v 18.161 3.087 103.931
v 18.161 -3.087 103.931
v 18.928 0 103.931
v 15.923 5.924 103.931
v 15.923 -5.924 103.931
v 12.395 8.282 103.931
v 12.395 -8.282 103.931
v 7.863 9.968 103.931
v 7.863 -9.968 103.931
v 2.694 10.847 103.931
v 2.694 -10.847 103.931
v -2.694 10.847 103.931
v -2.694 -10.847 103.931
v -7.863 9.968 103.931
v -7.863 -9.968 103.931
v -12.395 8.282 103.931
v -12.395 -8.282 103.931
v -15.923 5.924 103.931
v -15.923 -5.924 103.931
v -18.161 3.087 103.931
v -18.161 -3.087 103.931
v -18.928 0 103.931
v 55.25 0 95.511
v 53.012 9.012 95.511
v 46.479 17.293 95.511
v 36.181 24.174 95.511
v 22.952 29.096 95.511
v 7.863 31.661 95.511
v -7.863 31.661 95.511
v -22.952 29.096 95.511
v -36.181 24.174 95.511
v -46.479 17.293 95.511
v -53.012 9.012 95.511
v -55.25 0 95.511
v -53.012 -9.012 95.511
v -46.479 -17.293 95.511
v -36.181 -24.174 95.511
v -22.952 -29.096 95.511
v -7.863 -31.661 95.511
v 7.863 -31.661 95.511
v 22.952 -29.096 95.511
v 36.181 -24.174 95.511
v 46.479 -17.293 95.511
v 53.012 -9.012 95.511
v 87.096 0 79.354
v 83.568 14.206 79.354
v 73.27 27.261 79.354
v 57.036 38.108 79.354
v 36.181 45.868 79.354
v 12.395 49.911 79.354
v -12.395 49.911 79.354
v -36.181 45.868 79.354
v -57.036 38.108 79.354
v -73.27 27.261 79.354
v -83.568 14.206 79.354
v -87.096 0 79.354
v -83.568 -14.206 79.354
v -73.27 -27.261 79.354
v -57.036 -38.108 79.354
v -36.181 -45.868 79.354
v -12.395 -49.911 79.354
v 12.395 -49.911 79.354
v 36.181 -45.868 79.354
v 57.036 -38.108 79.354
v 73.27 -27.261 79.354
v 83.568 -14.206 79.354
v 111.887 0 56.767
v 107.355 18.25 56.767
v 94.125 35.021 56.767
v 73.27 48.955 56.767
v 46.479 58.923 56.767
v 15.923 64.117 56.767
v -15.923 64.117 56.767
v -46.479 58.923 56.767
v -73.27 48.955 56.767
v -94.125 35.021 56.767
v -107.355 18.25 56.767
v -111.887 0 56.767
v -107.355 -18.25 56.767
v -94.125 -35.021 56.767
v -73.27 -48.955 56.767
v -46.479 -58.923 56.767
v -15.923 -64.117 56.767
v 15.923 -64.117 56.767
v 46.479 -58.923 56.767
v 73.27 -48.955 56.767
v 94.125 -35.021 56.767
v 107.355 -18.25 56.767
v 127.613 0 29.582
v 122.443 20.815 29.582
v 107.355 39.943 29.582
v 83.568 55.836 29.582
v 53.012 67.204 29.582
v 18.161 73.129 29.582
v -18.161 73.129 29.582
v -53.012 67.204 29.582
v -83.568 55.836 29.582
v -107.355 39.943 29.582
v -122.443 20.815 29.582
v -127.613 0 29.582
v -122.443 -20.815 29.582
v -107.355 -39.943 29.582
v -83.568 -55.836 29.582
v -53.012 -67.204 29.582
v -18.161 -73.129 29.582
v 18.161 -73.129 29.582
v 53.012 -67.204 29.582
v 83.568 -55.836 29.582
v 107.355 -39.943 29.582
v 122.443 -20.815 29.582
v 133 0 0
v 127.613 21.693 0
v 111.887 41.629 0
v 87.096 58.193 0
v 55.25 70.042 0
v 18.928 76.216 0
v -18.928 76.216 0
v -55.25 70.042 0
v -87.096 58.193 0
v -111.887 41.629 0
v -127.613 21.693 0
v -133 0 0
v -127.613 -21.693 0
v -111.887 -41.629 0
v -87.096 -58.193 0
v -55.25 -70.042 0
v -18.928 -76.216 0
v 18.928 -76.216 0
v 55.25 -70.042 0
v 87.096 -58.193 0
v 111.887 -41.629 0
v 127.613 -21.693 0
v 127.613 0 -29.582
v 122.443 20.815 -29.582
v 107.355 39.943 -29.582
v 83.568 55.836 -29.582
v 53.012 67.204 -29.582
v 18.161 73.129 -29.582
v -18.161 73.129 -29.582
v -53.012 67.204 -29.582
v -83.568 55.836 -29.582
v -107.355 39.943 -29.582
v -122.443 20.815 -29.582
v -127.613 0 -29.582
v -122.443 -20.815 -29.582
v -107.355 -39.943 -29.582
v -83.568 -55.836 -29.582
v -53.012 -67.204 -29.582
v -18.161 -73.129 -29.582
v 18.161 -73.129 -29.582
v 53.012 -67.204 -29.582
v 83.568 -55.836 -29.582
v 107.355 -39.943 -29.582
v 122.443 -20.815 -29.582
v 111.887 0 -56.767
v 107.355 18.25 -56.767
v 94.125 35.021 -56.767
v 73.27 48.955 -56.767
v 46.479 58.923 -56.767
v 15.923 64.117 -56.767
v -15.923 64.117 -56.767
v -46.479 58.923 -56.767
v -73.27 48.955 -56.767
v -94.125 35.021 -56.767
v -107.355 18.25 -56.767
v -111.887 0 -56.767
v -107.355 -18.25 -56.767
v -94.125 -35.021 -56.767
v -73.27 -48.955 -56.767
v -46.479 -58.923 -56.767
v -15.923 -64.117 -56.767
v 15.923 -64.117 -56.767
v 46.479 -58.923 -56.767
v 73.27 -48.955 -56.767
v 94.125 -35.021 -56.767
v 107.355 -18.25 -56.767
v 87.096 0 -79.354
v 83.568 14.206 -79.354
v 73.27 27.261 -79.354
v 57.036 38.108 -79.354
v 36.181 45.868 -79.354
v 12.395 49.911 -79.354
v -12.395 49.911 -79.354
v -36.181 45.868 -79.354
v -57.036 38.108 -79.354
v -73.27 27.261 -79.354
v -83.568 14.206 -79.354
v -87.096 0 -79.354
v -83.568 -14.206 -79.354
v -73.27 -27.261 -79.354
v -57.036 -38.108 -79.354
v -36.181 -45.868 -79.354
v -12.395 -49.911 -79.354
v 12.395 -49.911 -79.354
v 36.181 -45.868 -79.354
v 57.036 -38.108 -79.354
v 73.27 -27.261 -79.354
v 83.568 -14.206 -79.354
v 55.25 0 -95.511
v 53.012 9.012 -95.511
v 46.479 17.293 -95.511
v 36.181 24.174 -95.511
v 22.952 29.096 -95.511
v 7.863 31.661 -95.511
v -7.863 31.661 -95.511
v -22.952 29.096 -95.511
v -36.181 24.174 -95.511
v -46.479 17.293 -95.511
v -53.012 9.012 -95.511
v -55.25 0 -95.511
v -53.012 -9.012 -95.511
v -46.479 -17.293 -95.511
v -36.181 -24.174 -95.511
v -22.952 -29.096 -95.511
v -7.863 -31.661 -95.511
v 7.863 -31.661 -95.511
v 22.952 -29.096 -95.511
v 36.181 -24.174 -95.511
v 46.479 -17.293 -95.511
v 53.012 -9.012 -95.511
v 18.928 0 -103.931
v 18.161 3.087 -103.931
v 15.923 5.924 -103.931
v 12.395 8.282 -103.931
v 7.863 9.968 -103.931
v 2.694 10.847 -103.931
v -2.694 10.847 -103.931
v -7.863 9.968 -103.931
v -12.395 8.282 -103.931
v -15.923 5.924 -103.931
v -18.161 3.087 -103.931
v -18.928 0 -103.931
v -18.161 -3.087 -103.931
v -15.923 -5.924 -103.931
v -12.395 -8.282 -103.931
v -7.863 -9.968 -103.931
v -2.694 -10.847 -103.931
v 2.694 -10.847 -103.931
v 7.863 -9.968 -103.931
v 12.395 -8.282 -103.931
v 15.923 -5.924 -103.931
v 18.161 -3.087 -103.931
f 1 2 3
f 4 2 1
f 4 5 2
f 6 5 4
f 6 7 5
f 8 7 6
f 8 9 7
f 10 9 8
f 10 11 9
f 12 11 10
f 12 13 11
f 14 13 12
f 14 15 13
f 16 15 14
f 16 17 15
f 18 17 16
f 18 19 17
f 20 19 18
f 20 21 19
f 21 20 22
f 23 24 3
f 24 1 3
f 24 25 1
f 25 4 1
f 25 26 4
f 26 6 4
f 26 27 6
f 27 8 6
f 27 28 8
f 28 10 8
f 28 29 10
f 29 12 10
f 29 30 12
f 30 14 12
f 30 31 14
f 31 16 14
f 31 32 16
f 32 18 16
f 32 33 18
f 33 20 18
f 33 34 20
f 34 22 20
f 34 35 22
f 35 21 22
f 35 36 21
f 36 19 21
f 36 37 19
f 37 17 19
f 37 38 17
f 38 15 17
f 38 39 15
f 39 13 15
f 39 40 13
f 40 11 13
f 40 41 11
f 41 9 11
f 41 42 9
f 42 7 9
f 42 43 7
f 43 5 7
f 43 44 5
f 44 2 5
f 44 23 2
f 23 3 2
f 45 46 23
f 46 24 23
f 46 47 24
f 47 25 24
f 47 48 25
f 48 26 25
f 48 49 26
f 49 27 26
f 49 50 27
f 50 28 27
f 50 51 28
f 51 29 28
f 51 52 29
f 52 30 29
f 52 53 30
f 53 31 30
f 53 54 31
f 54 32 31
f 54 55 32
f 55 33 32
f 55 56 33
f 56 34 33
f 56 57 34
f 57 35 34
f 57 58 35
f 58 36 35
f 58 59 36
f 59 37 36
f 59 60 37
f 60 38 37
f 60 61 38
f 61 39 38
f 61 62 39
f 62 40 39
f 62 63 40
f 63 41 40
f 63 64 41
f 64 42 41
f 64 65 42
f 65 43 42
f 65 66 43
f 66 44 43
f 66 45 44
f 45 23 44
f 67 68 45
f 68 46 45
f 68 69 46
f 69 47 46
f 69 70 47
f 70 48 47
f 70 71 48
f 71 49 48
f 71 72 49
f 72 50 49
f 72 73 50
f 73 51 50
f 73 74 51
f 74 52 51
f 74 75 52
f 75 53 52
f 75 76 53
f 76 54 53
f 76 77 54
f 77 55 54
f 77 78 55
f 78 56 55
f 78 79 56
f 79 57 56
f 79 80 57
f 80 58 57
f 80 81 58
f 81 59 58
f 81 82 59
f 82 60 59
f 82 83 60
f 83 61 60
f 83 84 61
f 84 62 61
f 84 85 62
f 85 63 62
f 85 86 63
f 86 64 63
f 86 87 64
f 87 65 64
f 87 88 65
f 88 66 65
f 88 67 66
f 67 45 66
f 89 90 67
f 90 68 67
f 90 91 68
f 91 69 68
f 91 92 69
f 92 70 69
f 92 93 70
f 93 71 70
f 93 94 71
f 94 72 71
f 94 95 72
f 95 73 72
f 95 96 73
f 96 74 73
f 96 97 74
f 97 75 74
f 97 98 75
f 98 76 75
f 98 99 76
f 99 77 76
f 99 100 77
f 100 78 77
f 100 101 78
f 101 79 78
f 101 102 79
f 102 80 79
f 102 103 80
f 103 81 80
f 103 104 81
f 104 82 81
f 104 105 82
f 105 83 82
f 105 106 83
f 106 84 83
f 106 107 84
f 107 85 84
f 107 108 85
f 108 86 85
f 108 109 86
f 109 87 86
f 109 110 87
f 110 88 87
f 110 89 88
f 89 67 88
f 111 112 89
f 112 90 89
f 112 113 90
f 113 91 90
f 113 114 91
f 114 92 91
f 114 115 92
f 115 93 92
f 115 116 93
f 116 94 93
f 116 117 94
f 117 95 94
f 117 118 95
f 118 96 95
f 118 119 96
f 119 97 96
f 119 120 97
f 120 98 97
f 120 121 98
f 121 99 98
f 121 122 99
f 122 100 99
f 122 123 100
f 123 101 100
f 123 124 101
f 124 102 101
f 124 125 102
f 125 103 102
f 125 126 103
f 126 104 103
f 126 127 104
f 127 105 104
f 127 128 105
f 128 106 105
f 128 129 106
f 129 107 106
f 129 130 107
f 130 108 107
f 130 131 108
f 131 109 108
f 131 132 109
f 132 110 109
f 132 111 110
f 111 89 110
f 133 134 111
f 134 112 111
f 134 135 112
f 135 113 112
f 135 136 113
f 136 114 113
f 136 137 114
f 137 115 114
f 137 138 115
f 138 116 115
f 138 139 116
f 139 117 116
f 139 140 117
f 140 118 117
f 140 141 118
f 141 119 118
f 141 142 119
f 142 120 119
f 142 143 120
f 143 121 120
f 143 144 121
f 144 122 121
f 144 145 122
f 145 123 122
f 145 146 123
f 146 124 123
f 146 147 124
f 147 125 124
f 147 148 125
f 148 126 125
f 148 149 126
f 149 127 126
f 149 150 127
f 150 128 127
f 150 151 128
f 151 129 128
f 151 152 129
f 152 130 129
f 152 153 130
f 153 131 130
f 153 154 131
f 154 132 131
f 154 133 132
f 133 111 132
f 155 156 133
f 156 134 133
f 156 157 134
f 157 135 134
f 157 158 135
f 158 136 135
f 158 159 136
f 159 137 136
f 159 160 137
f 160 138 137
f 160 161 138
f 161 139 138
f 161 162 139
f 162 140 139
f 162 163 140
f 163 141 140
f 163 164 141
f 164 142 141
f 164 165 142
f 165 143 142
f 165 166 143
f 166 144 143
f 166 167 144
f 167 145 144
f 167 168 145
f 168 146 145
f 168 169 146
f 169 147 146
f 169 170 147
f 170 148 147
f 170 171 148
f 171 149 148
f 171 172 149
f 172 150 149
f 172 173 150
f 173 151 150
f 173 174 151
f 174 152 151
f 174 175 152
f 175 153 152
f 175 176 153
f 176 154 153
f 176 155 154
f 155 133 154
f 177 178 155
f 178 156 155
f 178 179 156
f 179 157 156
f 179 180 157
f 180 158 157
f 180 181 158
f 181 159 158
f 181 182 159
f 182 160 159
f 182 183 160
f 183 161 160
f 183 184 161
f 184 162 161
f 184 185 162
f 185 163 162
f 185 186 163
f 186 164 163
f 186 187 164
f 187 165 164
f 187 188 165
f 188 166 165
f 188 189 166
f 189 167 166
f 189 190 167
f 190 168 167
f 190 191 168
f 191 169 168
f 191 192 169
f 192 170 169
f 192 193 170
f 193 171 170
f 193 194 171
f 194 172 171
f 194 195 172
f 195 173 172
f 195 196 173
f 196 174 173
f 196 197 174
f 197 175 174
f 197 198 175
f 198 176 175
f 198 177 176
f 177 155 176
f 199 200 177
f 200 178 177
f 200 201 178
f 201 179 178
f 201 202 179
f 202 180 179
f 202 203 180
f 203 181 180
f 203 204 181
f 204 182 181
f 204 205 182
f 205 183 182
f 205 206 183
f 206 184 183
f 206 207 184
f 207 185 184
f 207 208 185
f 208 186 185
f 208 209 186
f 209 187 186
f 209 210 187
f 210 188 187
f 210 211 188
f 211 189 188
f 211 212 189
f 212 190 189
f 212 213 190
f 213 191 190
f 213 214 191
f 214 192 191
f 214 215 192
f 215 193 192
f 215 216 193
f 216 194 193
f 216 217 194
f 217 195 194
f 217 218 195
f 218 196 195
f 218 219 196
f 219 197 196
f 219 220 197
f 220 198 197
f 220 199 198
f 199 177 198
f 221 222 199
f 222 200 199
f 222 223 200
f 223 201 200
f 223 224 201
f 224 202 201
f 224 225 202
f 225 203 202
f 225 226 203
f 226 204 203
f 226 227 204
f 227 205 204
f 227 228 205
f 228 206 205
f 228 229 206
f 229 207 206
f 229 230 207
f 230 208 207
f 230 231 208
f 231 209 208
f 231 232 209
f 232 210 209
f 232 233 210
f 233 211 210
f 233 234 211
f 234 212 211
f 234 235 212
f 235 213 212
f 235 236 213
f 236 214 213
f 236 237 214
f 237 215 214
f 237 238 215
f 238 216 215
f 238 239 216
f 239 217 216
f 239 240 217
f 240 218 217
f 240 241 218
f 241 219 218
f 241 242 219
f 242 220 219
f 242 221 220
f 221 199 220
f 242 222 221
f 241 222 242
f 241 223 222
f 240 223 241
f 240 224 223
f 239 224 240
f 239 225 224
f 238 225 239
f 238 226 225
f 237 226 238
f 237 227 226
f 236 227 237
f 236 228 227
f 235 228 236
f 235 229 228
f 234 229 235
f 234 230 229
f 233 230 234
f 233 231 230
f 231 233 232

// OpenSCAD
// Generated by SolidPython 1.0.1 on 2020-07-29 00:46:54


scale(v = [19, 11, 15]) {
	sphere(r = 7);
}
/***********************************************
*********      SolidPython code:      **********
************************************************
 
# import packages: SolidPython
from solid import *
from solid.utils import *
from itertools import chain, combinations, permutations


class Resize:

    def __init__(self, scad_file):
        self.scad_file = scad_file
        #self.scad_file = import_scad(scad_file)
        # cone/cylinder param:
        self.r1 = 0
        self.r2 = 0
        self.h = 0
        # rectangular prism param:
        self.w = 0
        self.l = 0
        # ellipse param:
        self.r = 0

    # import OpenScad code (file name corresponds to shape)


    # classify shape + parameters
    def assign(self, param1, param2, param3):
        if self.scad_file == 'cone.scad':
            self.r1 = param1
            self.r2 = param2
            self.h = param3
        elif self.scad_file == 'cylinder.scad':
            self.r1 = param1
            self.r2 = param2
            self.h = param3
        elif self.scad_file == 'rectangularPrism.scad':
            self.h = param1
            self.l = param2
            self.w = param3
        else:
            self.r = param1
            self.h = param2

    # resize parameters
    def iterate(self):
        x = range(3, 20, 2)
        i = 1
        if self.scad_file == 'cone.scad':
            tempList = list(permutations(x, 2))
            for temp in tempList:
                param1 = temp[0]
                param2 = temp[1]
                filepath = 'produced_scad_files/' + 'cone' + str(param1) + '_' + str(param2) + '_' + '.scad'
                scad_render_to_file(cylinder(h=param1, r1=param2, r2=0), filepath)

        elif self.scad_file == 'cylinder.scad':
            tempList = list(permutations(x, 3))
            for temp in tempList:
                param1 = temp[0]
                param2 = temp[1]
                filepath = 'produced_scad_files/' + 'cylinder' + str(param1) + '_' + str(param2) + '_' + '.scad'
                scad_render_to_file(cylinder(h=param1, r1=param2, r2=param2), filepath)

        elif self.scad_file == 'rectangularPrism.scad':
            tempList = list(permutations(x, 3))
            for temp in tempList:
                param1 = temp[0]
                param2 = temp[1]
                param3 = temp[2]
                filepath = 'produced_scad_files/' + 'rectangularPrism' + str(param1) + '_' + str(param2) + '_' + str(
                    param3) + '.scad'
                scad_render_to_file(cube(size=(param1, param2, param3)), filepath)

        elif self.scad_file == 'ellipse.scad':
            tempList = list(permutations(x, 4))
            for temp in tempList:
                param1 = temp[0]
                param2 = temp[1]
                param3 = temp[2]
                param4 = temp[3]
                filepath = 'produced_scad_files/' + 'ellipse' + str(param1) + '_' + str(param2) + '_' + str(param3) + '_' + str(param4) + '.scad'
                scad_render_to_file(scale([param1, param2, param3])(sphere(r=param4)), filepath)

    def render_to_scadfile(self):
        scad_render_to_file(scad, 'example.scad') 
 
************************************************/
